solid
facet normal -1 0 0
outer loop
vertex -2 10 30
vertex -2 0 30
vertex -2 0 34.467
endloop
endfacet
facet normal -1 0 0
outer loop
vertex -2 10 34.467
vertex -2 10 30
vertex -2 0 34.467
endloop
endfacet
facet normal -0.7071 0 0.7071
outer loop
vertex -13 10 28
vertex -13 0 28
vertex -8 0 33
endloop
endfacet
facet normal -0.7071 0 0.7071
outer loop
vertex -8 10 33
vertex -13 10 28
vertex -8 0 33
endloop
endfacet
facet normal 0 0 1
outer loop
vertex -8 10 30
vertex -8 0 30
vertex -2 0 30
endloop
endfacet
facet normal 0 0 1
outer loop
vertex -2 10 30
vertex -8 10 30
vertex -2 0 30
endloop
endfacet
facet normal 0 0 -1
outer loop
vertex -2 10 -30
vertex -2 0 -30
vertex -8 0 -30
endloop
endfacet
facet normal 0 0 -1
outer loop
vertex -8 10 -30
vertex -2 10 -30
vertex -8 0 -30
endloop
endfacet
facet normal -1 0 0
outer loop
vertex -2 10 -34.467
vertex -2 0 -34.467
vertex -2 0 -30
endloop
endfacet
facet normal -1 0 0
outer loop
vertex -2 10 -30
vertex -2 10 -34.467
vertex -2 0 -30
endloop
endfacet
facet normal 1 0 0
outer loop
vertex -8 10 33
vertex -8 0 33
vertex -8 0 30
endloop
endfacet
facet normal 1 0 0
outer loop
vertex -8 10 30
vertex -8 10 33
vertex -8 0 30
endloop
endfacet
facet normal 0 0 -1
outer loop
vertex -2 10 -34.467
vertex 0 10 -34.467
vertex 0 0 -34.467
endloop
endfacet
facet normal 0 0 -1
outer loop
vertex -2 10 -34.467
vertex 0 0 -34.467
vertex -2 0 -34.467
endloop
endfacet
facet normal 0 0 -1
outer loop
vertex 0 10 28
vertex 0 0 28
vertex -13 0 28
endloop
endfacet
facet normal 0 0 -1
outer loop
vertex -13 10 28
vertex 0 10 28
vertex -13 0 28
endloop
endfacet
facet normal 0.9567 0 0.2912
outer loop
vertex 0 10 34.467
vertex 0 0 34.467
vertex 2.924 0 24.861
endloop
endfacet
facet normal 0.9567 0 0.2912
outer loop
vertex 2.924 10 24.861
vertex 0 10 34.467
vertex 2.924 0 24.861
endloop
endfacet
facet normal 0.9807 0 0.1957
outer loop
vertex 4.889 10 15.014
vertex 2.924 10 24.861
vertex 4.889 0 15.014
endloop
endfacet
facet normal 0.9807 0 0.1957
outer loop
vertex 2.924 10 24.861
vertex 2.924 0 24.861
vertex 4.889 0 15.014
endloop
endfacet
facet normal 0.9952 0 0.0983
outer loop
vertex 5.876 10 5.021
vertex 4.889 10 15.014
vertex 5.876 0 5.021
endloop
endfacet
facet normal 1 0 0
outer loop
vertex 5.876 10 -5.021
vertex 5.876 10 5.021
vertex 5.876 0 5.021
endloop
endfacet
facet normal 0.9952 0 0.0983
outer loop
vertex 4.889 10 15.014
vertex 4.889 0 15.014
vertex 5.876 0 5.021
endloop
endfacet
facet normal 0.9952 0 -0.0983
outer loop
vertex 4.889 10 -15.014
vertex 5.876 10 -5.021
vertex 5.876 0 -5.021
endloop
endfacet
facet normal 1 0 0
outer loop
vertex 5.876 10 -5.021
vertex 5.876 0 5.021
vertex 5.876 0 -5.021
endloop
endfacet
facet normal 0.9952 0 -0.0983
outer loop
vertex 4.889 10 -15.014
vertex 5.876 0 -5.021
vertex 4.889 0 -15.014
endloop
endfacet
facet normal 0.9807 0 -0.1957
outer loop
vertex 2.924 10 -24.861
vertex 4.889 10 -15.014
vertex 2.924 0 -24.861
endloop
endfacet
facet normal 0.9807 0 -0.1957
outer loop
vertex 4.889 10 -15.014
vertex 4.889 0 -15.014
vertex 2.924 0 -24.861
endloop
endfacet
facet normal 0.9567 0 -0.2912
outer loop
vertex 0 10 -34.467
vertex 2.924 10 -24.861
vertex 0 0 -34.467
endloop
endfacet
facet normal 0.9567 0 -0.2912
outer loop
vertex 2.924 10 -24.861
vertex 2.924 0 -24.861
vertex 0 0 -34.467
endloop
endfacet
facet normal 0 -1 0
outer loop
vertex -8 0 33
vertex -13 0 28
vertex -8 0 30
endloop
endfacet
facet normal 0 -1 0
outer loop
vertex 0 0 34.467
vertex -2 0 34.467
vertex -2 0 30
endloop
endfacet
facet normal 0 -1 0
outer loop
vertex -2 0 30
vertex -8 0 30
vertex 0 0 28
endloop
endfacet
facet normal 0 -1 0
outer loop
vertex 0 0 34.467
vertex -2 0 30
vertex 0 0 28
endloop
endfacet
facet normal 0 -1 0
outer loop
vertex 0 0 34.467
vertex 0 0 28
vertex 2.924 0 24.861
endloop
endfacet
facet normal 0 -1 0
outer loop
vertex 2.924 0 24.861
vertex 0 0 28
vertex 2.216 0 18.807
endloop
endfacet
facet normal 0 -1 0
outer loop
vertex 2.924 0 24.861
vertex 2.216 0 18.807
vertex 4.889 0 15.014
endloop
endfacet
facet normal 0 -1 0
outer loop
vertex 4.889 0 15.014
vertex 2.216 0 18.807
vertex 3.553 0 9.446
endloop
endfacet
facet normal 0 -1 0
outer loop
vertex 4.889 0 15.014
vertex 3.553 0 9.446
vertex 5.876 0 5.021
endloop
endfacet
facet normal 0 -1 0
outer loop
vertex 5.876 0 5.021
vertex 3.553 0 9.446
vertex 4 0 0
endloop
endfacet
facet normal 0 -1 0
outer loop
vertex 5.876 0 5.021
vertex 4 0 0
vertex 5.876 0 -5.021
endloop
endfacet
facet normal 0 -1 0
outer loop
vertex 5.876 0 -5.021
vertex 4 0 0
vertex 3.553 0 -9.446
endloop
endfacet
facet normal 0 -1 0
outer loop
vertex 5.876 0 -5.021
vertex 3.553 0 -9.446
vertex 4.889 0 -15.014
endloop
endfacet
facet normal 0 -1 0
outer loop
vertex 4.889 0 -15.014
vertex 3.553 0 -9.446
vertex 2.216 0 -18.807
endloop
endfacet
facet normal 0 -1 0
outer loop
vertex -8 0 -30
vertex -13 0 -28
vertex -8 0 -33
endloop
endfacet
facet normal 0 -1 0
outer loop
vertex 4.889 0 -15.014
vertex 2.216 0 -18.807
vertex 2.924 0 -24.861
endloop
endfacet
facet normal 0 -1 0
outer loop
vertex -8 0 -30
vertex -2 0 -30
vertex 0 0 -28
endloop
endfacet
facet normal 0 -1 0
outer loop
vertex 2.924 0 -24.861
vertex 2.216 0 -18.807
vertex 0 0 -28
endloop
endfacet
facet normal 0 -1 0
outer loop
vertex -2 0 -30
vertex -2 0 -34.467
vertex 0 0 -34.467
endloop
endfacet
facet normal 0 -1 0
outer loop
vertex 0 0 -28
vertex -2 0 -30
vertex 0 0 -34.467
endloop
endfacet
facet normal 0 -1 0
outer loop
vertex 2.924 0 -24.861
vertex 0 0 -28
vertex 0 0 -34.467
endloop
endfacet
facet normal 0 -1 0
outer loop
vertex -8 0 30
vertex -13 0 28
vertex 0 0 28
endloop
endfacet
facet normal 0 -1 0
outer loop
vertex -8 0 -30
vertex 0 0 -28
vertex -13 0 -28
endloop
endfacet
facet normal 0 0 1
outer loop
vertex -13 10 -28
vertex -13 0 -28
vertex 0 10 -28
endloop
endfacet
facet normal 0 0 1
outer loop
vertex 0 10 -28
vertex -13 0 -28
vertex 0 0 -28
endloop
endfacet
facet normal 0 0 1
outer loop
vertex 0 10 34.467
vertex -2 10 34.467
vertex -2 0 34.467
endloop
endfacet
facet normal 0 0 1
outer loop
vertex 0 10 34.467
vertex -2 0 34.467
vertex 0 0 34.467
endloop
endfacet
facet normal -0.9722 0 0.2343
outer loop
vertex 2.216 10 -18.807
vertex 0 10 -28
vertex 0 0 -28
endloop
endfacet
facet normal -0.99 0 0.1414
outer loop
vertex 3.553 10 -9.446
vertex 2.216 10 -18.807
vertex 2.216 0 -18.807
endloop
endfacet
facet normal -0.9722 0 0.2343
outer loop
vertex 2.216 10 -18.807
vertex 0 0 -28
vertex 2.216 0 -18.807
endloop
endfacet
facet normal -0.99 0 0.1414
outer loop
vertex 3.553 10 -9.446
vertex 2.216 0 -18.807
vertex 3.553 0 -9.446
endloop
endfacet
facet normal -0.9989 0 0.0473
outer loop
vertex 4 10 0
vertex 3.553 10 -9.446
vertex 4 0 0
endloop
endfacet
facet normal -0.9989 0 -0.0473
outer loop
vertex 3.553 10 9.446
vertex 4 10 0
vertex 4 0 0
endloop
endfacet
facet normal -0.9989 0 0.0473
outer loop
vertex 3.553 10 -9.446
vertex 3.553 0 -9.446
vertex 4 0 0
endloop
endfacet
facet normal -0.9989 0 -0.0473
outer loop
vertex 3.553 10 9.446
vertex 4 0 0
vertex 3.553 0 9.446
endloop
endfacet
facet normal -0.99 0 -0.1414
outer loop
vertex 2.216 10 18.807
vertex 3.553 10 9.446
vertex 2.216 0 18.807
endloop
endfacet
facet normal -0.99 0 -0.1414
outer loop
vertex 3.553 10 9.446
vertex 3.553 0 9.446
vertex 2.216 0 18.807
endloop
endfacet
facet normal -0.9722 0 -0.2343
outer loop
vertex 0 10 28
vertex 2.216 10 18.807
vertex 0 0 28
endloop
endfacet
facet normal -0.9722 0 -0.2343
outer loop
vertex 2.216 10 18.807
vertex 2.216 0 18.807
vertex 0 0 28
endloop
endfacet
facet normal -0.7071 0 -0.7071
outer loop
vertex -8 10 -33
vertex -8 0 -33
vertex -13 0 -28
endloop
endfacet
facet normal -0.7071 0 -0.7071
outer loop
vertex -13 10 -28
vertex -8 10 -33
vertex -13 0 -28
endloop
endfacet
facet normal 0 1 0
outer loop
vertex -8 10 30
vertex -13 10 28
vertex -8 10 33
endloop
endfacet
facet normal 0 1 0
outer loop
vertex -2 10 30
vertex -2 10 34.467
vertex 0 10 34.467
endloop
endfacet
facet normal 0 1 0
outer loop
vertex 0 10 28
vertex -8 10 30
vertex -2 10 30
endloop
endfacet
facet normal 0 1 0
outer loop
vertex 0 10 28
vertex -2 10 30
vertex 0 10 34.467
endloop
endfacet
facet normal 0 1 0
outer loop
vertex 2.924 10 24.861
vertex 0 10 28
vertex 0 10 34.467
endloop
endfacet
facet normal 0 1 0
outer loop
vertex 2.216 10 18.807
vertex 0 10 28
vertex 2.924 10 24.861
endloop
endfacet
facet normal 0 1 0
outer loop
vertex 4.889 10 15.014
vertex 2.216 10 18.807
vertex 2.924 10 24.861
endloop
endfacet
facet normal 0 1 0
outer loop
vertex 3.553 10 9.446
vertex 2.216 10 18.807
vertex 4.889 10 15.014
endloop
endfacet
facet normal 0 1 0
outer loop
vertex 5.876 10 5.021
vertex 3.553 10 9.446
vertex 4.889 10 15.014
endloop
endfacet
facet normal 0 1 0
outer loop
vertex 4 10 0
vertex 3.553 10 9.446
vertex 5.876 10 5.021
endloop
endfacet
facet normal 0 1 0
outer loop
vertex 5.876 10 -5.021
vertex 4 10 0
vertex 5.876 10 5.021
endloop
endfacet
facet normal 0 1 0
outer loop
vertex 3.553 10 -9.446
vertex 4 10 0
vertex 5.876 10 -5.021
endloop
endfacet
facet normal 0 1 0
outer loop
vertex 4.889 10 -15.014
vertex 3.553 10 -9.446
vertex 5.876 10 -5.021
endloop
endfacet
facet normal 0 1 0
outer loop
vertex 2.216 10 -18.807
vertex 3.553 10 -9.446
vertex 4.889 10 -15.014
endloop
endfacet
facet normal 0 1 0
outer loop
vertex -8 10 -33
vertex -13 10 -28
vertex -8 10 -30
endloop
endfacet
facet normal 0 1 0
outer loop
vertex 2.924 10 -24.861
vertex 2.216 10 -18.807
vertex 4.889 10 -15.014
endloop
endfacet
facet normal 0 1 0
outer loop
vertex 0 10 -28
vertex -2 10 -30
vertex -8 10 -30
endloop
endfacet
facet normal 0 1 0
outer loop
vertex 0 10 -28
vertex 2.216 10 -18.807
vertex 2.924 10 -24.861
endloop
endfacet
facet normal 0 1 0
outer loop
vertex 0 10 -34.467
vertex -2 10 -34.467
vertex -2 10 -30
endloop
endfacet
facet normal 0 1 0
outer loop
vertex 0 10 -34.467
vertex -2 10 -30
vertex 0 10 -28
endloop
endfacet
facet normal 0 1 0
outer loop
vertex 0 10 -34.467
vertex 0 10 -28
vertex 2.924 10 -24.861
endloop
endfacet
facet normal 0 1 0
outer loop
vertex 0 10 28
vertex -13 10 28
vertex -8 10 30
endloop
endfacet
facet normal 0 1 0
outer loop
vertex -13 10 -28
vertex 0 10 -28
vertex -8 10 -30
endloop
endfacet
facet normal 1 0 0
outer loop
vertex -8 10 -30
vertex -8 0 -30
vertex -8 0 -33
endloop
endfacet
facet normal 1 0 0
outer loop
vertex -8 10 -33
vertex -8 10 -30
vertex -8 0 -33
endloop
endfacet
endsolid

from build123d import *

# Parameters (mm, degrees)
BOSS_EXTRU_1_DEPTH = 10


with BuildPart() as part:
    # Esquisse1 → Boss.-Extru.1 (new body)
    with BuildSketch(Plane(origin=(0, 0, 0), x_dir=(1, 0, 0), z_dir=(0, 1, 0))):
        with BuildLine():
            Line((0, -28), (-13, -28))
            Line((-13, -28), (-8, -33))
            Line((-8, -33), (-8, -30))
            Line((-8, -30), (-2, -30))
            Line((-2, -30), (-2, -34.467375879))
            Line((-2, -34.467375879), (0, -34.467375879))
            ThreePointArc((0, -34.467375879), (6, 0), (0, 34.467375879))
            Line((0, 34.467375879), (-2, 34.467375879))
            Line((-2, 34.467375879), (-2, 30))
            Line((-2, 30), (-8, 30))
            Line((-8, 30), (-8, 33))
            Line((-8, 33), (-13, 28))
            Line((-13, 28), (0, 28))
            ThreePointArc((0, 28), (4, 0), (0, -28))
        make_face()
    extrude(amount=BOSS_EXTRU_1_DEPTH)


solid = part.part
